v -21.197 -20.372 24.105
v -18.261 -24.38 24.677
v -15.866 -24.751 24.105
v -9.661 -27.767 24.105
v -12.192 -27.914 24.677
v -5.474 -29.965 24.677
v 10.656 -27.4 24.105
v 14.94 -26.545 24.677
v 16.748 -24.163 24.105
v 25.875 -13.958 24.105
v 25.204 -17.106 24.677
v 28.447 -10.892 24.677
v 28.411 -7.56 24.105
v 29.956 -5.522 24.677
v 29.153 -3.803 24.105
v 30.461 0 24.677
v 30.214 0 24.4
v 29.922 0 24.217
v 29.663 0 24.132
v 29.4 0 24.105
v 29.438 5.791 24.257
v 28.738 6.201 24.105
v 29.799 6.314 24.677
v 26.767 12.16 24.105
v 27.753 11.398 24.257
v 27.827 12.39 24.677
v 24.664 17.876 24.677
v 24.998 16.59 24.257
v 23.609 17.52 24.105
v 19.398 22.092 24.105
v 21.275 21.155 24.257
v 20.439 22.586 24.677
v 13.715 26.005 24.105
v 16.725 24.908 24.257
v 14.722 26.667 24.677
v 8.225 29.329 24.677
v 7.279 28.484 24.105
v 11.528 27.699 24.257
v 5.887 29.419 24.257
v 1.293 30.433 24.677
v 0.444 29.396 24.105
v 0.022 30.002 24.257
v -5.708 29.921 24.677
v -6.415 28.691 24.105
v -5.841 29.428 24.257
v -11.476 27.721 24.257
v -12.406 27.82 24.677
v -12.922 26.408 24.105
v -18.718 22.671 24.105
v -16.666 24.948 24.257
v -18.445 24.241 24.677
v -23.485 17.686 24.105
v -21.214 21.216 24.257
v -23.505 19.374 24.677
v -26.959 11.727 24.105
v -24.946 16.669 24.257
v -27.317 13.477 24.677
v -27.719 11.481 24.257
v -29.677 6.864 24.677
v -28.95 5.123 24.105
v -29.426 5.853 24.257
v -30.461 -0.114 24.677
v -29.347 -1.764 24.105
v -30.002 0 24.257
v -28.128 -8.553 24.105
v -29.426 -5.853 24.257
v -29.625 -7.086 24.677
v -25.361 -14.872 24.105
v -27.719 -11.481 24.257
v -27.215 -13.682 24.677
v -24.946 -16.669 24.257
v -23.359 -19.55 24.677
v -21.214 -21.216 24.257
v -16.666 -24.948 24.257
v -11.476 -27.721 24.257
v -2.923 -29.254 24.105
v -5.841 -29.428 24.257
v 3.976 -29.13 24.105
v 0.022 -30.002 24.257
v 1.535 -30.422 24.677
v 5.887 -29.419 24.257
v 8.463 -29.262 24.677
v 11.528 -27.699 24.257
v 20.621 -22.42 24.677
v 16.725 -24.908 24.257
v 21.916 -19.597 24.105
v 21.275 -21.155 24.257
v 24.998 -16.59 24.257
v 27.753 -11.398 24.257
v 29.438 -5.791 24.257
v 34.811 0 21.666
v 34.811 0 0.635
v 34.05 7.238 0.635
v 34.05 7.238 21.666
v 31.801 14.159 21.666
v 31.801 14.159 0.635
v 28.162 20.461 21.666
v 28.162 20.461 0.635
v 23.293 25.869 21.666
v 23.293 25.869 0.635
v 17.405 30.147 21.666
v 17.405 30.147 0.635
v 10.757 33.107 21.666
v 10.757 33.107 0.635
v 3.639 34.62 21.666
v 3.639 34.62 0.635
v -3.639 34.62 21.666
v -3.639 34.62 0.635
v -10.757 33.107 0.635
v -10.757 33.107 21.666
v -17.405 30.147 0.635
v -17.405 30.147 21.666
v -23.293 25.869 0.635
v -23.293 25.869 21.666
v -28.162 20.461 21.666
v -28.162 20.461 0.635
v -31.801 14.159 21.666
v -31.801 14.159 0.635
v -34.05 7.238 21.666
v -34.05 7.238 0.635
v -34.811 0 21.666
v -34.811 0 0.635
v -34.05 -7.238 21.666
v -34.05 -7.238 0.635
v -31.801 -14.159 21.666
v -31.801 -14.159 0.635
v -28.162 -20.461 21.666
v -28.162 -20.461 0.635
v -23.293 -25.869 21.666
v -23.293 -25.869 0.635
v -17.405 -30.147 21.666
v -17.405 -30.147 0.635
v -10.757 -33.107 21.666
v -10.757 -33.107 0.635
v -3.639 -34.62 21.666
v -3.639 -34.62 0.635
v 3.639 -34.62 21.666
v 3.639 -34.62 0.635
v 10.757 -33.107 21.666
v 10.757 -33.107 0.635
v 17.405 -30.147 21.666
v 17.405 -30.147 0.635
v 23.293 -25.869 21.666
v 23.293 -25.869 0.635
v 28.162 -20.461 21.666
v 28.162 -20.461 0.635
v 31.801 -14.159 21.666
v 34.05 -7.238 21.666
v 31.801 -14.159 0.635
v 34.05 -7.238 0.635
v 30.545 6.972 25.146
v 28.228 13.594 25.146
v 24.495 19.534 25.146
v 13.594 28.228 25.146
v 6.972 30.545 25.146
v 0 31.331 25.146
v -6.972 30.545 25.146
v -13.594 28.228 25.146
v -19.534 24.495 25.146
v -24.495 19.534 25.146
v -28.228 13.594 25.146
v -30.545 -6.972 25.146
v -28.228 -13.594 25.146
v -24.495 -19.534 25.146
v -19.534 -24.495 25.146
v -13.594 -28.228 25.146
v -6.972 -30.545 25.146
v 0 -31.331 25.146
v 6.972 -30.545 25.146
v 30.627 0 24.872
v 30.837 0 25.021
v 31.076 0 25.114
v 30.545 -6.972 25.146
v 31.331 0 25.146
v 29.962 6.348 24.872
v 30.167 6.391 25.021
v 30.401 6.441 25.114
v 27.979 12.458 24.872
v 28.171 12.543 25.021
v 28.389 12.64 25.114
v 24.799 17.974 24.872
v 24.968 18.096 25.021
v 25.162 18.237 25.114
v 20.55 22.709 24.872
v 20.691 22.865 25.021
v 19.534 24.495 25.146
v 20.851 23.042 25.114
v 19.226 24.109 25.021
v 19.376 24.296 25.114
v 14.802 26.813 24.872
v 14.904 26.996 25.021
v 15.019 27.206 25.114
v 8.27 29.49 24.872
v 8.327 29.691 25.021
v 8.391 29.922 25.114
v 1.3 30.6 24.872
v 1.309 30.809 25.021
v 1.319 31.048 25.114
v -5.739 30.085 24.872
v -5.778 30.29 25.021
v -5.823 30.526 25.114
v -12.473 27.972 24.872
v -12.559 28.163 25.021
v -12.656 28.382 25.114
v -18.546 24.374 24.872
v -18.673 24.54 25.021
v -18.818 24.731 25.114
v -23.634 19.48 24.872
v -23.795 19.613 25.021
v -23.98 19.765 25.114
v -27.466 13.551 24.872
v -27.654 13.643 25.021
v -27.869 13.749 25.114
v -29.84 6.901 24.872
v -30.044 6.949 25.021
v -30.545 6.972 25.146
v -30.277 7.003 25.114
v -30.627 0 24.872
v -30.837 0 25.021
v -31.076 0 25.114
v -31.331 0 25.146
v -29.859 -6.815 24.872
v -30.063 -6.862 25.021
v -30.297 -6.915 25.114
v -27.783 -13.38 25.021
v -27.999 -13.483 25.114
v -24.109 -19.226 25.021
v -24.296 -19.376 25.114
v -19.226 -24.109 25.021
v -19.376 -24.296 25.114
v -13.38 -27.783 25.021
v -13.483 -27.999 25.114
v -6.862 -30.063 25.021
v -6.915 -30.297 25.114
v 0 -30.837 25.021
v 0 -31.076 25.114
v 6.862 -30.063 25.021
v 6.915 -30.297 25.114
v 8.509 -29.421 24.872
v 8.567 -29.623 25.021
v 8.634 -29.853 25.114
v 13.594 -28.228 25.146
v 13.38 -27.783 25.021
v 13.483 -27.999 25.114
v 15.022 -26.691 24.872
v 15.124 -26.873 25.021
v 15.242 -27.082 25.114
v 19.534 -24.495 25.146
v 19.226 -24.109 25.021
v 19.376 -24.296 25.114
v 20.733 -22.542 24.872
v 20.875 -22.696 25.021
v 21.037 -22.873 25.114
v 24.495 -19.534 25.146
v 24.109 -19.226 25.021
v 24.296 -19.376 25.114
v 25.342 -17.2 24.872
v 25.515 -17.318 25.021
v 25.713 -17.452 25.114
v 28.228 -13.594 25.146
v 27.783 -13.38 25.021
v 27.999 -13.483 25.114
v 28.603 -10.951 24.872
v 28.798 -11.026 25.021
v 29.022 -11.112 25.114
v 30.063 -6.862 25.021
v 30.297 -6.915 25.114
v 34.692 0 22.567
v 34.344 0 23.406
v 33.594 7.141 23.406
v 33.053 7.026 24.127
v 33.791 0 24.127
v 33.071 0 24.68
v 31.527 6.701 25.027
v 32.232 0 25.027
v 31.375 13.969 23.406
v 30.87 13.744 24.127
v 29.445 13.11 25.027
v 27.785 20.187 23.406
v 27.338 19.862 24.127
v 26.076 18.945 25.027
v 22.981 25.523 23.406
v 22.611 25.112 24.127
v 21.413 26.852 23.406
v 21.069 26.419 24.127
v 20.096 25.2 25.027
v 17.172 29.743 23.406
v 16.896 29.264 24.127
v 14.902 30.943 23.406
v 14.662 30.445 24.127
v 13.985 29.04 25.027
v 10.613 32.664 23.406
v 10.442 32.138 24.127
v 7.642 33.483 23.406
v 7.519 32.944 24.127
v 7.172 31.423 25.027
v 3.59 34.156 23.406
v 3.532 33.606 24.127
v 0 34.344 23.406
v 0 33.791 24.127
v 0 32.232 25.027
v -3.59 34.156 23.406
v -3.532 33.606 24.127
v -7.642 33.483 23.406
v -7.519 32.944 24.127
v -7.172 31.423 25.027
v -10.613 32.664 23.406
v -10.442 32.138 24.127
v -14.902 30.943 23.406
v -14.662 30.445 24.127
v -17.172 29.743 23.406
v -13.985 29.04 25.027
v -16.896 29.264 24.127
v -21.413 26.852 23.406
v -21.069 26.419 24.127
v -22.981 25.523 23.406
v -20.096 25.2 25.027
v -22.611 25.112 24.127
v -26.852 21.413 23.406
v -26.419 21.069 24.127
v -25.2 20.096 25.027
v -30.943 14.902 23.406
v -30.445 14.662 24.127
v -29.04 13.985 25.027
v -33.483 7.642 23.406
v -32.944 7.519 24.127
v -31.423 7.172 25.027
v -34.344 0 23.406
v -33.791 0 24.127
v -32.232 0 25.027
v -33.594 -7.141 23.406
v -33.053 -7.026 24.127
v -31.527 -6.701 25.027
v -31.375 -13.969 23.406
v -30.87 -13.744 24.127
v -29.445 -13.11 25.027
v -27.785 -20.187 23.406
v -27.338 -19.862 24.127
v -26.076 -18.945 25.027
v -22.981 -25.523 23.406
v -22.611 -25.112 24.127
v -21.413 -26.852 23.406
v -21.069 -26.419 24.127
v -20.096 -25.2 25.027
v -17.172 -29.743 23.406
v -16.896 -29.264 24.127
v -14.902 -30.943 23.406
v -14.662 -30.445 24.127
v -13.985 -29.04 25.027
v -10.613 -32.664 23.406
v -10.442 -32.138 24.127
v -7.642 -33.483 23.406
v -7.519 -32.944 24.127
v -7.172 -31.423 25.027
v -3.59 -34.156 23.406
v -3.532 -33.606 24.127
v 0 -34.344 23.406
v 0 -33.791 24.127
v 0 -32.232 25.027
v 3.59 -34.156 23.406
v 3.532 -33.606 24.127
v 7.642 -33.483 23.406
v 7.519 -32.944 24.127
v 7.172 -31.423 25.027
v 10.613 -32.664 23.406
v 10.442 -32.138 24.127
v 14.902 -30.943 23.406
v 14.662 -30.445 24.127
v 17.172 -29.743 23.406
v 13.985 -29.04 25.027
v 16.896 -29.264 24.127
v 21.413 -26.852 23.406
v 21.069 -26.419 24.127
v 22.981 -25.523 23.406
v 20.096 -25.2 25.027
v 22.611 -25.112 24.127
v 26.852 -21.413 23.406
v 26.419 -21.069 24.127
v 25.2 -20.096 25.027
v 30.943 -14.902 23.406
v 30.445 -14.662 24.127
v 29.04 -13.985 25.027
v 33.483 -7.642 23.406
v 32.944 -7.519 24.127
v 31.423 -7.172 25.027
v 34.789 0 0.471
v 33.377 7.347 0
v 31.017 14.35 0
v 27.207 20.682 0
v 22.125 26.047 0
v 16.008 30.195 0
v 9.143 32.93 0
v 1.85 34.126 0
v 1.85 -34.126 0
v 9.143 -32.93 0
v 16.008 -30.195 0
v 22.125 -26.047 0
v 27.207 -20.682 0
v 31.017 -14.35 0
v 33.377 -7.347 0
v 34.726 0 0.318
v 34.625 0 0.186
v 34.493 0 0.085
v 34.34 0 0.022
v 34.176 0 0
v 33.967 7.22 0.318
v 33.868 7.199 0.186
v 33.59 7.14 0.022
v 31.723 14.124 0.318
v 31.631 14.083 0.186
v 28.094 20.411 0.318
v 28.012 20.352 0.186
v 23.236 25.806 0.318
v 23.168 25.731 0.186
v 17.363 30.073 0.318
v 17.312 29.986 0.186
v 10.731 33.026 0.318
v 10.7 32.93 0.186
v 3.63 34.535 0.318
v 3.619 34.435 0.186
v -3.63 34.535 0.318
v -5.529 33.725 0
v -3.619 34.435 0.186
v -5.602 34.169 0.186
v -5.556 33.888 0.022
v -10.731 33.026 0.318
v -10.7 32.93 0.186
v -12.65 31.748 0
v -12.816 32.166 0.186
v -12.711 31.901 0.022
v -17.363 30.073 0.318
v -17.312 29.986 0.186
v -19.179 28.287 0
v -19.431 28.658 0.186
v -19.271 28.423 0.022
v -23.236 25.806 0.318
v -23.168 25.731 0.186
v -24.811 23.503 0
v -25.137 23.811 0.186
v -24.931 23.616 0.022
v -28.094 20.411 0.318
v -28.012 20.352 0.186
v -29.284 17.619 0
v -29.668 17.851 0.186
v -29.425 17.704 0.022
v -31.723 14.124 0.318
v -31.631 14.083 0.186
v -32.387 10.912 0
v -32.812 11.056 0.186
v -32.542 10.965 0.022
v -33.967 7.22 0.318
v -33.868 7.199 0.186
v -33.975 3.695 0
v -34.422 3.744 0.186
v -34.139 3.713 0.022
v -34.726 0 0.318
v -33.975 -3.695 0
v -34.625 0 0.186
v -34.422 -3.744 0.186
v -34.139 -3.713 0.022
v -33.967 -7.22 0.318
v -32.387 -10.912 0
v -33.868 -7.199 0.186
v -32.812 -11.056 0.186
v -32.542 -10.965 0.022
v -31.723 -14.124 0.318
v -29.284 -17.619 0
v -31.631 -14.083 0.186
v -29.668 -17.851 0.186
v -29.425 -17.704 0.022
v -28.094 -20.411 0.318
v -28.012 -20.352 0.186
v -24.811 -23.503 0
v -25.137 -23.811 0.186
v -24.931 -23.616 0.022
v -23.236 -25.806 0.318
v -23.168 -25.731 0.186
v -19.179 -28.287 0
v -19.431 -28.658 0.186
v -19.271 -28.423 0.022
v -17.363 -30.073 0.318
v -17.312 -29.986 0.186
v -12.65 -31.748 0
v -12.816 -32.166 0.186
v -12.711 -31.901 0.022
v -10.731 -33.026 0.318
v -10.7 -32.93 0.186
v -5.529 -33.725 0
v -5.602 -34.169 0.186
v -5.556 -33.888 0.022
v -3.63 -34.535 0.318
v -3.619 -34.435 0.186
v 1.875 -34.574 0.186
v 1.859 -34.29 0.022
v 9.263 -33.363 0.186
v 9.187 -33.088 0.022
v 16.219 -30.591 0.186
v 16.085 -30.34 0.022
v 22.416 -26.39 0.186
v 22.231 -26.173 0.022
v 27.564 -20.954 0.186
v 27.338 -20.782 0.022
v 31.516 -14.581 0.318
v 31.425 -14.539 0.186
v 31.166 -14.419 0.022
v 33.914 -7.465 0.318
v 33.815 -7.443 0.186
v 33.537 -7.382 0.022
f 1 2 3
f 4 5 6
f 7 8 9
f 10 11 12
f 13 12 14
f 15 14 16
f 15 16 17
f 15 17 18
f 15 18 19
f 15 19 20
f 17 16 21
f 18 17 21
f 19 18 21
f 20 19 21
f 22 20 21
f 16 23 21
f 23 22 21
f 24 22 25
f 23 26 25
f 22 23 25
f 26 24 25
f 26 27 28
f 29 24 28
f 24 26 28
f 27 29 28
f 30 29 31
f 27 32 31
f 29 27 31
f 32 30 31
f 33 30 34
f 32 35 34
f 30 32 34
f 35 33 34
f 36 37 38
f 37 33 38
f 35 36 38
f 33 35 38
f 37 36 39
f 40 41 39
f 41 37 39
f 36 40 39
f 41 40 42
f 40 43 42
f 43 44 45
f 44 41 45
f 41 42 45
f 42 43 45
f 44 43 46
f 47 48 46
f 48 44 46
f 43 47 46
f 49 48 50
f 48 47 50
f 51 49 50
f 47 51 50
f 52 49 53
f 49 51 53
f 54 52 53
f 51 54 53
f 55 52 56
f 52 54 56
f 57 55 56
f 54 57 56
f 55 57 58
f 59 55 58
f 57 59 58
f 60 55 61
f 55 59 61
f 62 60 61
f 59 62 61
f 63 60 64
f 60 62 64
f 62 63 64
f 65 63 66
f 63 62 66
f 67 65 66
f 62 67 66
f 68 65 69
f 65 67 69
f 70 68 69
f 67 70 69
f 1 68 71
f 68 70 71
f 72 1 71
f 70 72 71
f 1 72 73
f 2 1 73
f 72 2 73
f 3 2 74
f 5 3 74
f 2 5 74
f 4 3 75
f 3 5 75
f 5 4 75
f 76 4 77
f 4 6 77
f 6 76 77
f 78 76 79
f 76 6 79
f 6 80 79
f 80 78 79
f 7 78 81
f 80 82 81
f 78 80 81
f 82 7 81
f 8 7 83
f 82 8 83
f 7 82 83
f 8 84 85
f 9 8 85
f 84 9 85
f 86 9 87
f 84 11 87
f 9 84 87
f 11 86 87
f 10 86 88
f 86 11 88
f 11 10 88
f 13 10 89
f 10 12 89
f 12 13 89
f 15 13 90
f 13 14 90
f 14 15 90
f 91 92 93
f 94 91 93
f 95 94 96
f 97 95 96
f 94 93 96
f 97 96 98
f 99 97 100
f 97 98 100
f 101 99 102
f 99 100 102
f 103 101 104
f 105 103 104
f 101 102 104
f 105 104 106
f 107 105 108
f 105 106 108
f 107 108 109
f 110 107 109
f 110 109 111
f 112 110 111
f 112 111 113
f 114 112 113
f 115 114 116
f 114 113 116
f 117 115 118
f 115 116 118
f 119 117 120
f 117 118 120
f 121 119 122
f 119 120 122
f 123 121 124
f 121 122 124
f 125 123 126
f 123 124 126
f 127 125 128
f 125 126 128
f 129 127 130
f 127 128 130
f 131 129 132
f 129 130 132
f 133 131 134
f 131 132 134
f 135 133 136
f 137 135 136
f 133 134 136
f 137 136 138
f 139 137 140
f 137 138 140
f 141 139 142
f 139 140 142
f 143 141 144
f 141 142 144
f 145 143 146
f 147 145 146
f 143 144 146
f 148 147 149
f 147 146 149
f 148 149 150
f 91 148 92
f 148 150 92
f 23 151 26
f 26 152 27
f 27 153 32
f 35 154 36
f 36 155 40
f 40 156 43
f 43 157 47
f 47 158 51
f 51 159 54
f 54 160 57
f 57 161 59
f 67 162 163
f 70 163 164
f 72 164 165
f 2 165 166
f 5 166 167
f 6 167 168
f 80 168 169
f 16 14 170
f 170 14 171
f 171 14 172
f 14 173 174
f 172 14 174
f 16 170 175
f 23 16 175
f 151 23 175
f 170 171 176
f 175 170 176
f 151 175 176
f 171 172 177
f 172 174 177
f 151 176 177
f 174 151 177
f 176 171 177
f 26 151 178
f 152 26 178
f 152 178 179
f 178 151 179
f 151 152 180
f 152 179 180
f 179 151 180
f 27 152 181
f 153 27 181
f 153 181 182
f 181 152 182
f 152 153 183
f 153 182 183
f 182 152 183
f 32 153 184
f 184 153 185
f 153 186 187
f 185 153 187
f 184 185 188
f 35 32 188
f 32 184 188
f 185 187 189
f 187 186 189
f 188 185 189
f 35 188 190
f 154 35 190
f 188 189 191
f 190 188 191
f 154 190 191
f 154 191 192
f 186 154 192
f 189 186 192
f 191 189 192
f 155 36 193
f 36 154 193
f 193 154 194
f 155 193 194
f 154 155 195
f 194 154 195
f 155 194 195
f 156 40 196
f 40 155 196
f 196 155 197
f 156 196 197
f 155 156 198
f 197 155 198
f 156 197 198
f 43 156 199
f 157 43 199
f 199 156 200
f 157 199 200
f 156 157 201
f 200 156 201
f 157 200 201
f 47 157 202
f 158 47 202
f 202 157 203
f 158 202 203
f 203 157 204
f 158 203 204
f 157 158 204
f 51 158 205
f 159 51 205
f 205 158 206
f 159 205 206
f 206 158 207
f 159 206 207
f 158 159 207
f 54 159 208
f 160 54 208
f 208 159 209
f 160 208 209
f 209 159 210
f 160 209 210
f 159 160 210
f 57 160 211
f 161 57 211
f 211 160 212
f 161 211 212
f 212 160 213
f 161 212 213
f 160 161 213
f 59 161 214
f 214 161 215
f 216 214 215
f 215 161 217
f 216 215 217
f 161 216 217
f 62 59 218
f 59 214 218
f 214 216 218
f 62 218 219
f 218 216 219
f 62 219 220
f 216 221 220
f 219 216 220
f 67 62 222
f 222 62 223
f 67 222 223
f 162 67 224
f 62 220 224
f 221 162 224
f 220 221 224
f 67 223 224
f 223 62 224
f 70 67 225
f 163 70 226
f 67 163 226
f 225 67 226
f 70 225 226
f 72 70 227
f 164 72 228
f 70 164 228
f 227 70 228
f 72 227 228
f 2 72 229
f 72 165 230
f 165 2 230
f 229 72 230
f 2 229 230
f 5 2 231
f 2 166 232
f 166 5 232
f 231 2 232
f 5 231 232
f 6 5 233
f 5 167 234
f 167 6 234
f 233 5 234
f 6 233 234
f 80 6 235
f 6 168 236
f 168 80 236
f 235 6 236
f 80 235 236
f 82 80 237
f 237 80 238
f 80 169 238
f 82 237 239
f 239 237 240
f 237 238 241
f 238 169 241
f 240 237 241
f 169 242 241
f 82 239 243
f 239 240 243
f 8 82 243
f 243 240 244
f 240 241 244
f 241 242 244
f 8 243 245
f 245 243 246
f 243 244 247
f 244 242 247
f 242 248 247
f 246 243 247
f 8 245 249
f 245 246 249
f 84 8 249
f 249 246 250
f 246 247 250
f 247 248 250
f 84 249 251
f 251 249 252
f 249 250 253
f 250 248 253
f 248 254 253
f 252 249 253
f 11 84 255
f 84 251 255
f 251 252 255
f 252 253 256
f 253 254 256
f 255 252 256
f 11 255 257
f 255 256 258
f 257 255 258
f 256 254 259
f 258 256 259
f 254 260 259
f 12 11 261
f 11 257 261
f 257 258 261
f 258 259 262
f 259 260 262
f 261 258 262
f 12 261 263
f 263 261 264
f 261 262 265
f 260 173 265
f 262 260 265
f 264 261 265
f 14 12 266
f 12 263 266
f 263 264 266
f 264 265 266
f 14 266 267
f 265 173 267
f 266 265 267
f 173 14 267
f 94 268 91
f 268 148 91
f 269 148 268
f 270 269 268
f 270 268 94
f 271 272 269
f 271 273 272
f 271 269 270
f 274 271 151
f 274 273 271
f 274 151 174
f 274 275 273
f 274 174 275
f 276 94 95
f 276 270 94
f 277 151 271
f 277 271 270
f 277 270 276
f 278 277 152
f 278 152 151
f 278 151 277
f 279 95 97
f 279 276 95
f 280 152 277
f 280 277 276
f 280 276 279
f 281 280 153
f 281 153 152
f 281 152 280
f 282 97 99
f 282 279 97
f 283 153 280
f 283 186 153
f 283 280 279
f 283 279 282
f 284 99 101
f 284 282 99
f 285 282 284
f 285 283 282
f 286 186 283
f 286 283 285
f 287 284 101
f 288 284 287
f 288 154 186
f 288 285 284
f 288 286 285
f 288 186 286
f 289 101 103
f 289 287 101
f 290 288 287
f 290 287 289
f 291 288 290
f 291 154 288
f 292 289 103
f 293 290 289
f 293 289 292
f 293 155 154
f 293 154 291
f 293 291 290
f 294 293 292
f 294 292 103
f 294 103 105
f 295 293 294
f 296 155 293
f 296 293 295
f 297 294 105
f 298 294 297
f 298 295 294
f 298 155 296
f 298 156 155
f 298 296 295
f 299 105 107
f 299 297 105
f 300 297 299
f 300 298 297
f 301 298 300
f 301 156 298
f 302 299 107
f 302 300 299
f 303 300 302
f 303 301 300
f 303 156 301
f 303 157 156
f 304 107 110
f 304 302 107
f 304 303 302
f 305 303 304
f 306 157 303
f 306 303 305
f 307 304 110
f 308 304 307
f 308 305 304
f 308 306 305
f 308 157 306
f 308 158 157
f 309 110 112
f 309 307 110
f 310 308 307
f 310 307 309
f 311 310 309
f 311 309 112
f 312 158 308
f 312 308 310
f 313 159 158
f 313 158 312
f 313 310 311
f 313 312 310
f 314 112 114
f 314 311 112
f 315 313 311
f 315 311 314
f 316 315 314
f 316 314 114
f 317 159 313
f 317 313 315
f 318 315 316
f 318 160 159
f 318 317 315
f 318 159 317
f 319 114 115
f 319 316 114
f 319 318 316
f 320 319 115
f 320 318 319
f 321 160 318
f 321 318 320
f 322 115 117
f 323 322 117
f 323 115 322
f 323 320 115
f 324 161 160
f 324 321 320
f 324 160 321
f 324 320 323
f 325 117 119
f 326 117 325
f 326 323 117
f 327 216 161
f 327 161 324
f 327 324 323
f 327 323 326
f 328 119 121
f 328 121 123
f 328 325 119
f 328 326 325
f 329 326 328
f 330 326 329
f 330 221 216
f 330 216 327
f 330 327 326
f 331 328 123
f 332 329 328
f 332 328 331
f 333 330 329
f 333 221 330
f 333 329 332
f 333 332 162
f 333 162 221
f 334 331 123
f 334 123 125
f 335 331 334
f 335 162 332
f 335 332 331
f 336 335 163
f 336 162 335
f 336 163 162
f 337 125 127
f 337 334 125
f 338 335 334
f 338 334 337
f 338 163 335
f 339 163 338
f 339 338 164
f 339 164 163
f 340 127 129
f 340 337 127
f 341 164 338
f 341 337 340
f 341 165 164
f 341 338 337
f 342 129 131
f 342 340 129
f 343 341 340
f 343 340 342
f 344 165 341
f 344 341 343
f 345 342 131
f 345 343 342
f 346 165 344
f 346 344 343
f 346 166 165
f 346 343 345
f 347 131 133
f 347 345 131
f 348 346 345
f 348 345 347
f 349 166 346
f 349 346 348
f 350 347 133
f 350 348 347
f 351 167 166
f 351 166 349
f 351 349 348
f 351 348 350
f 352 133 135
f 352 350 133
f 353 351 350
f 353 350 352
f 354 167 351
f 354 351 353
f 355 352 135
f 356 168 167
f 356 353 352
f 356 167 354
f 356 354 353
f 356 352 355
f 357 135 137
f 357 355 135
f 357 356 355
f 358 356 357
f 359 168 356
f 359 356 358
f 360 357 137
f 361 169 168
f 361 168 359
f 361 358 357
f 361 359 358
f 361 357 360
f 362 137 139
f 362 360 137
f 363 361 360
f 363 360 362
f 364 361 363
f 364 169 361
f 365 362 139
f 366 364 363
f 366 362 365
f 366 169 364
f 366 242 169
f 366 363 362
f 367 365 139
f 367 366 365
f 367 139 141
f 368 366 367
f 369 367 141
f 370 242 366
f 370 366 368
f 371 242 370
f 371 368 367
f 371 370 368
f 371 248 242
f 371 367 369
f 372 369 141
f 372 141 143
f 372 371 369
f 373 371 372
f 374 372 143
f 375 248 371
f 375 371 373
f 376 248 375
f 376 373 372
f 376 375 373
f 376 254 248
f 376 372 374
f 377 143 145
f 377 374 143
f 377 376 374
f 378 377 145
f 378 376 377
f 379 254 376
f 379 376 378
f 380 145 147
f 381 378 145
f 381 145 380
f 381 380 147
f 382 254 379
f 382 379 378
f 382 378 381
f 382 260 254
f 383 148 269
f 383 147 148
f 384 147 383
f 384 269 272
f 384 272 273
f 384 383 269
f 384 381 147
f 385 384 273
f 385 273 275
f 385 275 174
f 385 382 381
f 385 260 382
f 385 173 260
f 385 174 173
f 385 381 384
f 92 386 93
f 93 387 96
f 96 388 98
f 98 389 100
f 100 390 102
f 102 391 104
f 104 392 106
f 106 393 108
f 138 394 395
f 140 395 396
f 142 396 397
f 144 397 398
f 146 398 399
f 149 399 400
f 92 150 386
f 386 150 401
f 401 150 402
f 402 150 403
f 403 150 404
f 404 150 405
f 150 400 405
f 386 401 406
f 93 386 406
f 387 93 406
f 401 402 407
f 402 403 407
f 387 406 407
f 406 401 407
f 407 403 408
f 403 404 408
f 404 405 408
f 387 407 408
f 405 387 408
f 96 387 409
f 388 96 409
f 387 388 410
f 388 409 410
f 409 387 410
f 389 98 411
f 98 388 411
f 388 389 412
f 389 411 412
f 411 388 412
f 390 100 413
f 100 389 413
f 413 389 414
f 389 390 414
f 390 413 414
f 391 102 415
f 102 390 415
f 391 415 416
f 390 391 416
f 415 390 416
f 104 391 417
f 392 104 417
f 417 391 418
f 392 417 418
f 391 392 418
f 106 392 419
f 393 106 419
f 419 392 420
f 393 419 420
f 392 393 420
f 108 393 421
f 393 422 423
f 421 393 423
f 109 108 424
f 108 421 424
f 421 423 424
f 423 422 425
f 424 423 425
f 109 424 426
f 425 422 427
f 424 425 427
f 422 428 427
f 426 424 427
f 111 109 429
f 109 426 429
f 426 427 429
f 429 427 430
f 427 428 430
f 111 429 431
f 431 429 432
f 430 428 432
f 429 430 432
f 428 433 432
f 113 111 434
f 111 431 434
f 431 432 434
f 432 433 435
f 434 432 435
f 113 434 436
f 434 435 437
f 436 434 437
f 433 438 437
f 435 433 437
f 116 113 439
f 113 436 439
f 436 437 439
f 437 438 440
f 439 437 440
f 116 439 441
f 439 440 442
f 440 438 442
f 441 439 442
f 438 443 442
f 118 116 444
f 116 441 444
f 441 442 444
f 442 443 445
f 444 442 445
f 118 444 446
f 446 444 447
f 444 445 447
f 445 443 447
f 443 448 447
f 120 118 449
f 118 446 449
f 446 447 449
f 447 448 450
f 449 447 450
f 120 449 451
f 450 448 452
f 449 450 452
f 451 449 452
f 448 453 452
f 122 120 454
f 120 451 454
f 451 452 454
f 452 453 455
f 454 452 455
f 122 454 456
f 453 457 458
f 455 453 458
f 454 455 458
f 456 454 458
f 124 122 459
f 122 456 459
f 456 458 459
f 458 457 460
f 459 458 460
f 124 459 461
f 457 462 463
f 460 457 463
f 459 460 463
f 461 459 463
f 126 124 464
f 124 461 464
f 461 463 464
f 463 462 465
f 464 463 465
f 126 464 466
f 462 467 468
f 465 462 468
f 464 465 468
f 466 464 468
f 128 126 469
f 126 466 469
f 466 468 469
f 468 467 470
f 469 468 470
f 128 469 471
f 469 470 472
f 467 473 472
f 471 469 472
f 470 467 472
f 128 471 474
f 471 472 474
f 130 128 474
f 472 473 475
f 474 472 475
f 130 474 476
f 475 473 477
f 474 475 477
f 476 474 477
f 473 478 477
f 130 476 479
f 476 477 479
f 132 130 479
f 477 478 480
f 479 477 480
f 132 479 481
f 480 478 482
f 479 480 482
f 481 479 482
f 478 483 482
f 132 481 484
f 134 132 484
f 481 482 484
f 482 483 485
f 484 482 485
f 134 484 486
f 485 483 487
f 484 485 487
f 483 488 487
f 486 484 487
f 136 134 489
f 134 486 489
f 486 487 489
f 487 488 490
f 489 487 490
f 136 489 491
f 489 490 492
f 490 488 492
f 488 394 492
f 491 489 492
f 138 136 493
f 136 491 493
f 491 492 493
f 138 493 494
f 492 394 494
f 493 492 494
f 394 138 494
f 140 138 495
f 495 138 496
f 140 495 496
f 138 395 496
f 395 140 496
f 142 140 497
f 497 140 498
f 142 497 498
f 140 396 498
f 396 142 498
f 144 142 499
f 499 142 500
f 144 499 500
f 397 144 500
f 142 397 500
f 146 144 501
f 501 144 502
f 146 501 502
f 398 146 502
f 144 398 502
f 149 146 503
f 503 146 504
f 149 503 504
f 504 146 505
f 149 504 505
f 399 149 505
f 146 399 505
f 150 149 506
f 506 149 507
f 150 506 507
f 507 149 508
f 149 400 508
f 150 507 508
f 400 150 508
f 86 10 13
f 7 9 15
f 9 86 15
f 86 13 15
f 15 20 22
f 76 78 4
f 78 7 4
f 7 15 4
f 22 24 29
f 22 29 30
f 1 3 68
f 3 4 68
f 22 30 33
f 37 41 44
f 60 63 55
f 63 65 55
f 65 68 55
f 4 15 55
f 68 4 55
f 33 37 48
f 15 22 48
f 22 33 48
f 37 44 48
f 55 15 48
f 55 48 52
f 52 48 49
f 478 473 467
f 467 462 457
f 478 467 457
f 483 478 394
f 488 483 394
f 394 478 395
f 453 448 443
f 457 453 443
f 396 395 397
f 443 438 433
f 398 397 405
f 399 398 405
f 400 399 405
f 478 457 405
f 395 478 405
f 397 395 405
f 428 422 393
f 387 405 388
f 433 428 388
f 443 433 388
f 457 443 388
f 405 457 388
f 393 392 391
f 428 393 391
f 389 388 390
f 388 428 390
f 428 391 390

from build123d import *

# Parameters (mm, degrees)
F0_R     = 34.8107
F1_DEPTH = 25.146
F2_R     = 3.4798
F3_R     = 0.635
F6_R     = 1.27


with BuildPart() as f1:
    # F0 (on Top) → F1 (new body)
    with BuildSketch(Plane.XY):
        Circle(F0_R)
    extrude(amount=F1_DEPTH)

    # F2
    f2_edges = [f1.edges().sort_by_distance(p)[0] for p in [
        (-34.8107, 0, 25.146),
    ]]
    fillet(f2_edges, radius=F2_R)

    # F3
    f3_edges = [f1.edges().sort_by_distance(p)[0] for p in [
        (-34.8107, 0, 0),
    ]]
    fillet(f3_edges, radius=F3_R)

    # F4 (on Front) → F5 (revolve, cut)
    with BuildSketch(Plane.XZ):
        with BuildLine():
            Line((0, 25.146), (0, 24.1046))
            Line((0, 24.1046), (30.2895, 24.1046))
            ThreePointArc((30.2895, 24.1046), (30.594519, 24.840981), (31.3309, 25.146))
            Line((31.3309, 25.146), (0, 25.146))
        make_face()
    revolve(axis=Axis((0, 0, 24.6253), (0, 0, 1)), mode=Mode.SUBTRACT)

    # F6
    f6_edges = [f1.edges().sort_by_distance(p)[0] for p in [
        (-30.2895, 0, 24.1046),
    ]]
    fillet(f6_edges, radius=F6_R)


solid = f1.part
